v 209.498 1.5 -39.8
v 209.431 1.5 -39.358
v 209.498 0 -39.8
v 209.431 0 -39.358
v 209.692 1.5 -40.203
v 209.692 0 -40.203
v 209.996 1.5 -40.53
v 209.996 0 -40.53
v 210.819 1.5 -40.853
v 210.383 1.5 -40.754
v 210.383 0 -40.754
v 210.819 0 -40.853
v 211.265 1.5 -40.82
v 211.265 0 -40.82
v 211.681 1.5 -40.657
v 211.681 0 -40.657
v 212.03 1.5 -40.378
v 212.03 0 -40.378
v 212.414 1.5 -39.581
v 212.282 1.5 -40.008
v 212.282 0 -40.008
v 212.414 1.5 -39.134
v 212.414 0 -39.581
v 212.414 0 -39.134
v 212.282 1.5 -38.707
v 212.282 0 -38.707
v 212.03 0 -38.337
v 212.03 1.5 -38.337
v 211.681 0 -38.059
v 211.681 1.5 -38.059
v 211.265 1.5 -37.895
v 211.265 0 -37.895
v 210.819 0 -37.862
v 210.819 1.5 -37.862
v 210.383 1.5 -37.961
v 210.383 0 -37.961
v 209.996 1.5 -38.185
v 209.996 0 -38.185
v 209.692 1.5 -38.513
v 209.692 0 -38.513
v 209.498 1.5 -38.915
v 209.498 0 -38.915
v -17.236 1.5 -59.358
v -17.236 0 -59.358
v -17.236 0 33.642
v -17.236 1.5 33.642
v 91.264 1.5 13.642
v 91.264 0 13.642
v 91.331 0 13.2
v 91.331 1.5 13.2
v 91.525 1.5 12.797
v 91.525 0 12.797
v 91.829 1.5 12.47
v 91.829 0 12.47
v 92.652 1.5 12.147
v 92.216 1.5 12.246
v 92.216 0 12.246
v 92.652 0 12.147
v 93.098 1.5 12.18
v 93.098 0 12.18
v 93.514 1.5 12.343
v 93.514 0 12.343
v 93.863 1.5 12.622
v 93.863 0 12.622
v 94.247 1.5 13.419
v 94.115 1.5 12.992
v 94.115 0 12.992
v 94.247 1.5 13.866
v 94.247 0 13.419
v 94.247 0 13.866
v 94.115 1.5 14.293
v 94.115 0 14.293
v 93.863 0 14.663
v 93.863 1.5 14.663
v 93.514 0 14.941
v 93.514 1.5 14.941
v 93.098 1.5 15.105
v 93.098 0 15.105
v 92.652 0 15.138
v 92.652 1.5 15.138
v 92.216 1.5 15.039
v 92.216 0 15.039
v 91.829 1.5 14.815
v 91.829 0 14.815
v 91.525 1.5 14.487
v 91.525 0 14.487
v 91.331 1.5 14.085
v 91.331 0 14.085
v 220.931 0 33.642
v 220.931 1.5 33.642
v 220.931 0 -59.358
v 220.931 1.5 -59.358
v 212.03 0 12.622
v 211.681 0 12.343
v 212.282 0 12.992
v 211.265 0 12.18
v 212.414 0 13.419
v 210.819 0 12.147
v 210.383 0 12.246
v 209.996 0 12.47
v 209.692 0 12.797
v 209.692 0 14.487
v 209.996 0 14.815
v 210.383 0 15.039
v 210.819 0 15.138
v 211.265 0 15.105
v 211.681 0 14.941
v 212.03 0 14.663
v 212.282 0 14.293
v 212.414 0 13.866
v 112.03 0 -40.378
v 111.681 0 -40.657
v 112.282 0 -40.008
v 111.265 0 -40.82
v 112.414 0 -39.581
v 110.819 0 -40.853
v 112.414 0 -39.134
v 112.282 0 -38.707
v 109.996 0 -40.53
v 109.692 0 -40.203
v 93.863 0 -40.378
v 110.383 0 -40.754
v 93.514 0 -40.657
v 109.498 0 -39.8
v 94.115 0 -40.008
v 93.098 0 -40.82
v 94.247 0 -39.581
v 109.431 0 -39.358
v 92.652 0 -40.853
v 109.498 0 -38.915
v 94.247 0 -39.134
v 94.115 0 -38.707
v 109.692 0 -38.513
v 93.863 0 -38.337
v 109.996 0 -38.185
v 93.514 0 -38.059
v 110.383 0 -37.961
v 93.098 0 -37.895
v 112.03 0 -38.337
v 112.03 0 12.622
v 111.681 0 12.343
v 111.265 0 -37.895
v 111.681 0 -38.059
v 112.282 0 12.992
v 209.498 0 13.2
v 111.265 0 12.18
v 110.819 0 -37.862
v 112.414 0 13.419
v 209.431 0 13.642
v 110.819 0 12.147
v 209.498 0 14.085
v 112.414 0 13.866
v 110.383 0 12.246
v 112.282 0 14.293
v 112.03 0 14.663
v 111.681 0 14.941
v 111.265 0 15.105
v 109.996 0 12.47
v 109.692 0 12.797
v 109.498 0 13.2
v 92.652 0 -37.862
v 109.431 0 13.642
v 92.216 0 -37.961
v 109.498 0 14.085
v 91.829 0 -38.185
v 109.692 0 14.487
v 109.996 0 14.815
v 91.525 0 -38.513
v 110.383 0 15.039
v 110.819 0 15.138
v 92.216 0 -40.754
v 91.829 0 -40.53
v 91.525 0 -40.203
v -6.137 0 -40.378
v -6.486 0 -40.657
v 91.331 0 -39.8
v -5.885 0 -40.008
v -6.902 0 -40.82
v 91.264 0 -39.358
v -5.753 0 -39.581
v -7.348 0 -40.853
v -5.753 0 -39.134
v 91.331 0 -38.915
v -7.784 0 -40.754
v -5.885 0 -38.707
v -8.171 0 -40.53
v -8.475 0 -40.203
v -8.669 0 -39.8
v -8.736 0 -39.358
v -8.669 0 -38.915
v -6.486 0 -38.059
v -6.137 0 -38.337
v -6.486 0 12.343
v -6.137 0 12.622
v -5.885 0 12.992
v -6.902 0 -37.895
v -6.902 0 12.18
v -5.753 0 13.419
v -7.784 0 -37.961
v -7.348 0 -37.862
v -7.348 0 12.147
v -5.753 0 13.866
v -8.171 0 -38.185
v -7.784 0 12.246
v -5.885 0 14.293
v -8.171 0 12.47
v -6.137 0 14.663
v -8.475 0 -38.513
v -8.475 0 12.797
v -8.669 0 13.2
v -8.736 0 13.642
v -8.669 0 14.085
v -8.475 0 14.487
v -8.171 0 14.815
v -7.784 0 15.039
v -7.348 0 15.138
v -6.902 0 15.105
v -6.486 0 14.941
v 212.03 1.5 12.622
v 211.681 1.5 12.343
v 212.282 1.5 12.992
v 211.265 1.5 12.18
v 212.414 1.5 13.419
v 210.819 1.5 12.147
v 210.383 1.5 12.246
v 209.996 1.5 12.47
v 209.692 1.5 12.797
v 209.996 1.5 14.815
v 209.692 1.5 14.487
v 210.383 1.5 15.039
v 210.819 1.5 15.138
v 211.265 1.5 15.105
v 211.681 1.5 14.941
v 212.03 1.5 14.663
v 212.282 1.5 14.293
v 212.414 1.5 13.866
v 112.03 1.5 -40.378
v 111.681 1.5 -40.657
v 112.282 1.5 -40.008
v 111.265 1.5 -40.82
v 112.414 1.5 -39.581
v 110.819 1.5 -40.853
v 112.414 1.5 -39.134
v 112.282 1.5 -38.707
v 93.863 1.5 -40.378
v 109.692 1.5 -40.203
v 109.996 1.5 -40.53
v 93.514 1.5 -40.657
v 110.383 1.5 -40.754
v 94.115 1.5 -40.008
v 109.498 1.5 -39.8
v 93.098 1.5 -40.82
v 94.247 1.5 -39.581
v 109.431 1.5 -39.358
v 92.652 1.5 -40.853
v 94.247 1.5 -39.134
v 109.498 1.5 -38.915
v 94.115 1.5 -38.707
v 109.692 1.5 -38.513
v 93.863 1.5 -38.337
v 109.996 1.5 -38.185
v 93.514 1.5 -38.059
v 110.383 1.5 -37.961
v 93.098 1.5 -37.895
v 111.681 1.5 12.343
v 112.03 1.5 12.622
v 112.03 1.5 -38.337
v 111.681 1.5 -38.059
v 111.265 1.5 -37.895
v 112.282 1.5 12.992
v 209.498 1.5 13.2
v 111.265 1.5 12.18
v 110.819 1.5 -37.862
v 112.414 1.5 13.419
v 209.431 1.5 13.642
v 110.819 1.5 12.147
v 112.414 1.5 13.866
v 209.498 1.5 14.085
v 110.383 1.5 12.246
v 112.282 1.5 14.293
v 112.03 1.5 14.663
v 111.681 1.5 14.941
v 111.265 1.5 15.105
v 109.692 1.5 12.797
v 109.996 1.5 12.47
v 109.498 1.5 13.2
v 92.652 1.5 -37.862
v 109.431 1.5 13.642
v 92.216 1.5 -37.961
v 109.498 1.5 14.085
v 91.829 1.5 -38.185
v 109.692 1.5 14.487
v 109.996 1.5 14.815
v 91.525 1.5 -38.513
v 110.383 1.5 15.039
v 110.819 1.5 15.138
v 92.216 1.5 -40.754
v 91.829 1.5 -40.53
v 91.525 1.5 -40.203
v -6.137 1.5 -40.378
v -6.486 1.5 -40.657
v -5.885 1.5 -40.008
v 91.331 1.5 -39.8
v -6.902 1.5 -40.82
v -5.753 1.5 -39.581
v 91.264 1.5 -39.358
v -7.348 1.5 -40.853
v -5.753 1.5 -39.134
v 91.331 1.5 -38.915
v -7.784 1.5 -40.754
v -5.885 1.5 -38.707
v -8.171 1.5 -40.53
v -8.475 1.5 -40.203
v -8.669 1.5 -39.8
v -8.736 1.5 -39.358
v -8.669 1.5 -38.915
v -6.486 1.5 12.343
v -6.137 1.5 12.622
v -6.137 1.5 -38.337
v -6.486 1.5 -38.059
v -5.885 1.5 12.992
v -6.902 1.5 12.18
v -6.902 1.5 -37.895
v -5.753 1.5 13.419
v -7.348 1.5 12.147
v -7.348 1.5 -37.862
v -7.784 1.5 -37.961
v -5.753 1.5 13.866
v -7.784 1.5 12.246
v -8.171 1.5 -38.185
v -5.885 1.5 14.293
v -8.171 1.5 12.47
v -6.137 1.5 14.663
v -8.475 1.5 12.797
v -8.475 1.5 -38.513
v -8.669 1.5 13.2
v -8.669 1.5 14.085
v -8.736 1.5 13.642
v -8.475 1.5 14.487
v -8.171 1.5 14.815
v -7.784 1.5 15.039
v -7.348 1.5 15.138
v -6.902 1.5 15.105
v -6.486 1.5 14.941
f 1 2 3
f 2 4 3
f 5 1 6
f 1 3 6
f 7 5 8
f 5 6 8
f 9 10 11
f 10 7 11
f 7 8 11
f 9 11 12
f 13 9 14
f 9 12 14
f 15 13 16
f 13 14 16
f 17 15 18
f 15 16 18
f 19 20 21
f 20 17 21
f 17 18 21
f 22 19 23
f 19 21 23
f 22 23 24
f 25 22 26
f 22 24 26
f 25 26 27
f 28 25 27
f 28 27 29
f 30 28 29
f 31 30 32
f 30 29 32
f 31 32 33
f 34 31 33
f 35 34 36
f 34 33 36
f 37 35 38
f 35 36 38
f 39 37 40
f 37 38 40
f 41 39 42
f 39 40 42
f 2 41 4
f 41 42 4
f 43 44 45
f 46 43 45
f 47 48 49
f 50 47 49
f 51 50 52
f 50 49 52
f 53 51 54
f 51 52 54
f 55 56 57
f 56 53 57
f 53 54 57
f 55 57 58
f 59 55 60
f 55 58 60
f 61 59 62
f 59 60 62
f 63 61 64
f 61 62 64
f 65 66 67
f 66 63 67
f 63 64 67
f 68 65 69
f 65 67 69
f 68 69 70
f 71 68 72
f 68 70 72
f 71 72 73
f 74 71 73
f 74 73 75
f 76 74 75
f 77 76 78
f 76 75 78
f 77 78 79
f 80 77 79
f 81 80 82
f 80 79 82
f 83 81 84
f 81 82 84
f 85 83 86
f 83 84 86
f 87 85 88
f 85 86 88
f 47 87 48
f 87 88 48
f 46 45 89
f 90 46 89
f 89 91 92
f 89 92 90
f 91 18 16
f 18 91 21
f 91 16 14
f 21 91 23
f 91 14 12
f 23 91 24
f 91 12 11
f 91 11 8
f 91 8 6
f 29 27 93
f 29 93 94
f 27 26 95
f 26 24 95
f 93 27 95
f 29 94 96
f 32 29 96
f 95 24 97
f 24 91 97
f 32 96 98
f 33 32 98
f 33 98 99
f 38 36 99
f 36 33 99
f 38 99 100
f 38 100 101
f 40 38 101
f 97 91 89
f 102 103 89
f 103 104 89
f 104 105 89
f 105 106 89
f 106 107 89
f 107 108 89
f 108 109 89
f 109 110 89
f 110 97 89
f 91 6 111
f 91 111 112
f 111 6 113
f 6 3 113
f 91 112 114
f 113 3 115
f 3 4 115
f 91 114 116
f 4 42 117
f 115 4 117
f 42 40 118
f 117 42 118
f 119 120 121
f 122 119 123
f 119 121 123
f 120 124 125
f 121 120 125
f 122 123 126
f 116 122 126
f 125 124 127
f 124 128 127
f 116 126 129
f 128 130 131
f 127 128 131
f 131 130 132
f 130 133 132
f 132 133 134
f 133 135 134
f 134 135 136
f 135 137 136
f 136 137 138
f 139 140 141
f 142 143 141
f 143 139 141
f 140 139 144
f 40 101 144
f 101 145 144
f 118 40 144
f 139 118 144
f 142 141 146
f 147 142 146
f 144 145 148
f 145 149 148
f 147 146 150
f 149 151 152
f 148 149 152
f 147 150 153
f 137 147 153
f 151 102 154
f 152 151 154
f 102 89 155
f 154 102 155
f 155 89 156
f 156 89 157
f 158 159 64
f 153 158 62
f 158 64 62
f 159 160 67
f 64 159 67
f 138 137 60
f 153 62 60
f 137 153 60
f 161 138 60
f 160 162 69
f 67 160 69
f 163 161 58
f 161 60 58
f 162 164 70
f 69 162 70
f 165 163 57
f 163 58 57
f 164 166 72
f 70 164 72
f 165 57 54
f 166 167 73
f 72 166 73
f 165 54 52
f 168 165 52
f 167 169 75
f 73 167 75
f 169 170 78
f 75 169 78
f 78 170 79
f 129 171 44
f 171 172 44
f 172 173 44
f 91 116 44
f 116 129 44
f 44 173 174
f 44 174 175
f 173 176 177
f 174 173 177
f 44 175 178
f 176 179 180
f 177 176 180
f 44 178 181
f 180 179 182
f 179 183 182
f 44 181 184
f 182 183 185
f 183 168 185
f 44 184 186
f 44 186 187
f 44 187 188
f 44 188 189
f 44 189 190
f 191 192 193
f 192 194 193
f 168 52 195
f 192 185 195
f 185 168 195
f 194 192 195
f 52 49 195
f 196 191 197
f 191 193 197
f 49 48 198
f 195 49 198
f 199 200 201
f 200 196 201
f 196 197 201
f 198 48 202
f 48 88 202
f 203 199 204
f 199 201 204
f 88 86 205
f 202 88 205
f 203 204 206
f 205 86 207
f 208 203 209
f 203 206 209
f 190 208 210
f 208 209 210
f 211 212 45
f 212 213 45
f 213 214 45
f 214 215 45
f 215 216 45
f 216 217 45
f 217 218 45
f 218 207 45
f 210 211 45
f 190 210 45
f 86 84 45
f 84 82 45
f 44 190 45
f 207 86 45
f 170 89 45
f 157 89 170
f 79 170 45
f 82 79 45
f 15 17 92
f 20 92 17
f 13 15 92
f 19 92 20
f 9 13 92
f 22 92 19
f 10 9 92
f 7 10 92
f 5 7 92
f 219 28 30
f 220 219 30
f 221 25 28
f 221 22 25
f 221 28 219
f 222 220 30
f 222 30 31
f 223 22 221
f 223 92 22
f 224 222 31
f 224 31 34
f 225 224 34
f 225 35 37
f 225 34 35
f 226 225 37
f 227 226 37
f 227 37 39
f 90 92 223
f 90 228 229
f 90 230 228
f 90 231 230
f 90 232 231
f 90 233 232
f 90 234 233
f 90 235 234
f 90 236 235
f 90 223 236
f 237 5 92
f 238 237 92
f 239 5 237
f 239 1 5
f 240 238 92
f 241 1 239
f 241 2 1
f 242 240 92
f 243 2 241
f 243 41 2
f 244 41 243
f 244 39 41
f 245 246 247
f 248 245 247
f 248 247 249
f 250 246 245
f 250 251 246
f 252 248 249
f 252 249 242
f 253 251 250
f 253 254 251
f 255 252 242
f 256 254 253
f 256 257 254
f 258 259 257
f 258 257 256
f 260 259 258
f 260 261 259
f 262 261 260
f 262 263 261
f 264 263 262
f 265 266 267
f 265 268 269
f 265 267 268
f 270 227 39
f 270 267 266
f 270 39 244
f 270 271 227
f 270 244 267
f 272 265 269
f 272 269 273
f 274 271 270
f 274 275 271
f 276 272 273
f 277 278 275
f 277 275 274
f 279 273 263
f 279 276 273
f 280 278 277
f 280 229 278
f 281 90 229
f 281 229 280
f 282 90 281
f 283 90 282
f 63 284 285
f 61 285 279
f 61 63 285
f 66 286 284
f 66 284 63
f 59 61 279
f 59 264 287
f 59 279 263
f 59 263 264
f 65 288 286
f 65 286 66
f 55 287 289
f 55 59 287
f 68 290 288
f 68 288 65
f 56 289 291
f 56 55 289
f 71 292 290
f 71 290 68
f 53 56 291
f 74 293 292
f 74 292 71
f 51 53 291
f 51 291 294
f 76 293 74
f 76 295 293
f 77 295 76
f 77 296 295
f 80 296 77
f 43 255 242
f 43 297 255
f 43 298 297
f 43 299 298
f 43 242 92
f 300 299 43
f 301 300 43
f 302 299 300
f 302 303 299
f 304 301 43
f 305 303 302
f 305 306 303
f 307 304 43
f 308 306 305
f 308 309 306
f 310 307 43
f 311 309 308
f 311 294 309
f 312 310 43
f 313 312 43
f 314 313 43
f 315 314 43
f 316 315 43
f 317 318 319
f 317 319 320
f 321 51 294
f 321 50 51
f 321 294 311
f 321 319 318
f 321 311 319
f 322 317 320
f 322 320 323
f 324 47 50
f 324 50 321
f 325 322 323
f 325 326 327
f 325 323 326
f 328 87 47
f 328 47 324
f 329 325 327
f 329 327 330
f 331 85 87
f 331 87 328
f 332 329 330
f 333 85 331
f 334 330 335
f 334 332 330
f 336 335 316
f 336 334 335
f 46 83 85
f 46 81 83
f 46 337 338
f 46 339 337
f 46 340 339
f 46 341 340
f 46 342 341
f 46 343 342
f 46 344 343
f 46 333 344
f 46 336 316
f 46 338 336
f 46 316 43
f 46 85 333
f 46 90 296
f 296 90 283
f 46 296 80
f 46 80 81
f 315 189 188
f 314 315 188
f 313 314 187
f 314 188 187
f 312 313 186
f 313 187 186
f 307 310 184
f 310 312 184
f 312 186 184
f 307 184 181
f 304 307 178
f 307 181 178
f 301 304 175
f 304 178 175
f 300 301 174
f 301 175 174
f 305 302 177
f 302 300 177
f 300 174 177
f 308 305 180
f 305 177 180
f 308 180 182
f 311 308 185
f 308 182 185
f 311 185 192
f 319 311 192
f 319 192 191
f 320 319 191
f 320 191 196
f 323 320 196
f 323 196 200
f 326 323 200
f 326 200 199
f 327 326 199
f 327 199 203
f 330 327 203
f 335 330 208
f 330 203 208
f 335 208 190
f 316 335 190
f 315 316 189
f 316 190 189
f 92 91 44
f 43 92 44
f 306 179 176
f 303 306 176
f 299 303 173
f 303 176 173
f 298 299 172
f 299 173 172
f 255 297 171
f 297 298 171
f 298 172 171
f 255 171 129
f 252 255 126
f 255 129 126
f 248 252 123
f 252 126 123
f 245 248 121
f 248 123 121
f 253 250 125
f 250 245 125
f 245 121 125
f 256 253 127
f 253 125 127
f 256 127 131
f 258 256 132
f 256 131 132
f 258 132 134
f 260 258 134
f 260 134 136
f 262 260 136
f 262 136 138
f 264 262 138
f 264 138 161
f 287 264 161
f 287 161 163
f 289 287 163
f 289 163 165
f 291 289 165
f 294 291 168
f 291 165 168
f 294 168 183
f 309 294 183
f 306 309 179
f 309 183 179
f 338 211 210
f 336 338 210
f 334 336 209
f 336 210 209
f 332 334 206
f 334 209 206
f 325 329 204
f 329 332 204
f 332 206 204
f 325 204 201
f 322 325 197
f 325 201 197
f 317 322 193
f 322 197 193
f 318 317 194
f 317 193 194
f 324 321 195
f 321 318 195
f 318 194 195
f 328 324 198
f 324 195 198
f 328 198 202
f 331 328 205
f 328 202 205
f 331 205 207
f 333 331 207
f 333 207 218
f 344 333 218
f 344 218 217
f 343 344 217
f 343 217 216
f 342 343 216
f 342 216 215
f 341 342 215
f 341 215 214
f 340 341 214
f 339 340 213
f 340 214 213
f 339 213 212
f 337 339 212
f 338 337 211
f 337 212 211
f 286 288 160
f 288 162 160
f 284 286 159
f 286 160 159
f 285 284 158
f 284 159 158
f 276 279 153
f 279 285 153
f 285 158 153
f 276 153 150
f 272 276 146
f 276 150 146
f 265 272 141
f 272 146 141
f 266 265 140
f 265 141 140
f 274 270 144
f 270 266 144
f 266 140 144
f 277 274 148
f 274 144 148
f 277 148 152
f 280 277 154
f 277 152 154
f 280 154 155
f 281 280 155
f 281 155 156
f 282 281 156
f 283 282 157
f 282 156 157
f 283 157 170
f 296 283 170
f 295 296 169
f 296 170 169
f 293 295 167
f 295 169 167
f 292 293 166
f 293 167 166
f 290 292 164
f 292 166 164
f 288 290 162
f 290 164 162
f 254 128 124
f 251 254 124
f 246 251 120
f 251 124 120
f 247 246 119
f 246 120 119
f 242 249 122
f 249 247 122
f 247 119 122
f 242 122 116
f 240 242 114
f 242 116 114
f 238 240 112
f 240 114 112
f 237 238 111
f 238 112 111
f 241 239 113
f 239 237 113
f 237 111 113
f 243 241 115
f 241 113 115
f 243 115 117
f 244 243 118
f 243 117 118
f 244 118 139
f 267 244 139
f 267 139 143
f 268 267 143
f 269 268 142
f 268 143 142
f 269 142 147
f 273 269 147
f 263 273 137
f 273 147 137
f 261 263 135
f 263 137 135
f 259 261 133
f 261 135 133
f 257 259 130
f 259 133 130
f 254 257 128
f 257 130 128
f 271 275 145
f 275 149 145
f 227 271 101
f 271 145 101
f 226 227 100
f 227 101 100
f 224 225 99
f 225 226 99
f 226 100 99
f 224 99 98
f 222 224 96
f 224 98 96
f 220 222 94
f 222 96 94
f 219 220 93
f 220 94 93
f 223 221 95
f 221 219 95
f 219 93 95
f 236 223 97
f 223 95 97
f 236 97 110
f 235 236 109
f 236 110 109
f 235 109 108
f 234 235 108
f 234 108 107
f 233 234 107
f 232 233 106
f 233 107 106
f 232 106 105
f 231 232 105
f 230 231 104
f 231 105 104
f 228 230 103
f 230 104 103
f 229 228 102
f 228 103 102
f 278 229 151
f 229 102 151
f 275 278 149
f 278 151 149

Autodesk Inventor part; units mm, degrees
ref_plane "YZ Plane" through (0, 0, 0) normal (1, 0, 0) x (0, 1, 0)
ref_plane "XZ Plane" through (0, 0, 0) normal (0, 1, 0) x (-1, 0, 0)
ref_plane "XY Plane" through (0, 0, 0) normal (0, 0, 1) x (1, 0, 0)
sketch "Sketch1" plane through (0, 0, 0) normal (0, 1, 0) x (-1, 0, 0)
  circle A0 centre (7.2361, 13.6424) radius 1.5
  line L0 (0, 1.6974) -> (0, -1.2933)
  line L1 (1.3539, 0) -> (-1.1645, 0)
  circle A1 centre (7.2361, -39.3576) radius 1.5
  circle A2 centre (-92.7639, 13.6424) radius 1.5
  circle A3 centre (-92.7639, -39.3576) radius 1.5
  line L2 (17.2361, 33.6424) -> (-101.8474, 33.6424)
  line L3 (-101.8474, 33.6424) -> (-101.8474, -59.3576)
  line L4 (-101.8474, -59.3576) -> (17.2361, -59.3576)
  line L5 (17.2361, -59.3576) -> (17.2361, 33.6424)
  circle A4 centre (-210.9309, 13.6424) radius 1.5
  circle A5 centre (-210.9309, -39.3576) radius 1.5
  circle A6 centre (-110.9309, 13.6424) radius 1.5
  circle A7 centre (-110.9309, -39.3576) radius 1.5
  line L6 (-220.9309, 33.6424) -> (-101.8474, 33.6424)
  line L7 (-101.8474, -59.3576) -> (-220.9309, -59.3576)
  line L8 (-220.9309, -59.3576) -> (-220.9309, 33.6424)
  point P0 (0, 0)
  dimension "d2" = 3
  dimension "d14" = 53
  dimension "d24" = 100
  dimension "d39" = 20
  dimension "d46" = 20
  dimension "d53" = 10
  dimension "TavolsagAKetNyakKozott" = 18.167
extrude "Extrusion1" add sketch "Sketch1" along normal blind 1.5
ref_plane "Work Plane1" through (101.8474, 0, 33.6424) normal (1, 0, 0) x (0, 0, -1)
equation "\"d2\" = JukakANyakon"
equation "\"d14\" = JukakKoztiTavolsagSzeleseg"
equation "\"d24\" = JukaKoztiTavolsagHoszusag"
equation "\"JukakANyakon\" = 3"
equation "\"JukakKoztiTavolsagSzeleseg\" = 53"
equation "\"JukaKoztiTavolsagHoszusag\" = 100"
properties part number "AlsoLemezVizhutes" material "Steel, Alloy"
